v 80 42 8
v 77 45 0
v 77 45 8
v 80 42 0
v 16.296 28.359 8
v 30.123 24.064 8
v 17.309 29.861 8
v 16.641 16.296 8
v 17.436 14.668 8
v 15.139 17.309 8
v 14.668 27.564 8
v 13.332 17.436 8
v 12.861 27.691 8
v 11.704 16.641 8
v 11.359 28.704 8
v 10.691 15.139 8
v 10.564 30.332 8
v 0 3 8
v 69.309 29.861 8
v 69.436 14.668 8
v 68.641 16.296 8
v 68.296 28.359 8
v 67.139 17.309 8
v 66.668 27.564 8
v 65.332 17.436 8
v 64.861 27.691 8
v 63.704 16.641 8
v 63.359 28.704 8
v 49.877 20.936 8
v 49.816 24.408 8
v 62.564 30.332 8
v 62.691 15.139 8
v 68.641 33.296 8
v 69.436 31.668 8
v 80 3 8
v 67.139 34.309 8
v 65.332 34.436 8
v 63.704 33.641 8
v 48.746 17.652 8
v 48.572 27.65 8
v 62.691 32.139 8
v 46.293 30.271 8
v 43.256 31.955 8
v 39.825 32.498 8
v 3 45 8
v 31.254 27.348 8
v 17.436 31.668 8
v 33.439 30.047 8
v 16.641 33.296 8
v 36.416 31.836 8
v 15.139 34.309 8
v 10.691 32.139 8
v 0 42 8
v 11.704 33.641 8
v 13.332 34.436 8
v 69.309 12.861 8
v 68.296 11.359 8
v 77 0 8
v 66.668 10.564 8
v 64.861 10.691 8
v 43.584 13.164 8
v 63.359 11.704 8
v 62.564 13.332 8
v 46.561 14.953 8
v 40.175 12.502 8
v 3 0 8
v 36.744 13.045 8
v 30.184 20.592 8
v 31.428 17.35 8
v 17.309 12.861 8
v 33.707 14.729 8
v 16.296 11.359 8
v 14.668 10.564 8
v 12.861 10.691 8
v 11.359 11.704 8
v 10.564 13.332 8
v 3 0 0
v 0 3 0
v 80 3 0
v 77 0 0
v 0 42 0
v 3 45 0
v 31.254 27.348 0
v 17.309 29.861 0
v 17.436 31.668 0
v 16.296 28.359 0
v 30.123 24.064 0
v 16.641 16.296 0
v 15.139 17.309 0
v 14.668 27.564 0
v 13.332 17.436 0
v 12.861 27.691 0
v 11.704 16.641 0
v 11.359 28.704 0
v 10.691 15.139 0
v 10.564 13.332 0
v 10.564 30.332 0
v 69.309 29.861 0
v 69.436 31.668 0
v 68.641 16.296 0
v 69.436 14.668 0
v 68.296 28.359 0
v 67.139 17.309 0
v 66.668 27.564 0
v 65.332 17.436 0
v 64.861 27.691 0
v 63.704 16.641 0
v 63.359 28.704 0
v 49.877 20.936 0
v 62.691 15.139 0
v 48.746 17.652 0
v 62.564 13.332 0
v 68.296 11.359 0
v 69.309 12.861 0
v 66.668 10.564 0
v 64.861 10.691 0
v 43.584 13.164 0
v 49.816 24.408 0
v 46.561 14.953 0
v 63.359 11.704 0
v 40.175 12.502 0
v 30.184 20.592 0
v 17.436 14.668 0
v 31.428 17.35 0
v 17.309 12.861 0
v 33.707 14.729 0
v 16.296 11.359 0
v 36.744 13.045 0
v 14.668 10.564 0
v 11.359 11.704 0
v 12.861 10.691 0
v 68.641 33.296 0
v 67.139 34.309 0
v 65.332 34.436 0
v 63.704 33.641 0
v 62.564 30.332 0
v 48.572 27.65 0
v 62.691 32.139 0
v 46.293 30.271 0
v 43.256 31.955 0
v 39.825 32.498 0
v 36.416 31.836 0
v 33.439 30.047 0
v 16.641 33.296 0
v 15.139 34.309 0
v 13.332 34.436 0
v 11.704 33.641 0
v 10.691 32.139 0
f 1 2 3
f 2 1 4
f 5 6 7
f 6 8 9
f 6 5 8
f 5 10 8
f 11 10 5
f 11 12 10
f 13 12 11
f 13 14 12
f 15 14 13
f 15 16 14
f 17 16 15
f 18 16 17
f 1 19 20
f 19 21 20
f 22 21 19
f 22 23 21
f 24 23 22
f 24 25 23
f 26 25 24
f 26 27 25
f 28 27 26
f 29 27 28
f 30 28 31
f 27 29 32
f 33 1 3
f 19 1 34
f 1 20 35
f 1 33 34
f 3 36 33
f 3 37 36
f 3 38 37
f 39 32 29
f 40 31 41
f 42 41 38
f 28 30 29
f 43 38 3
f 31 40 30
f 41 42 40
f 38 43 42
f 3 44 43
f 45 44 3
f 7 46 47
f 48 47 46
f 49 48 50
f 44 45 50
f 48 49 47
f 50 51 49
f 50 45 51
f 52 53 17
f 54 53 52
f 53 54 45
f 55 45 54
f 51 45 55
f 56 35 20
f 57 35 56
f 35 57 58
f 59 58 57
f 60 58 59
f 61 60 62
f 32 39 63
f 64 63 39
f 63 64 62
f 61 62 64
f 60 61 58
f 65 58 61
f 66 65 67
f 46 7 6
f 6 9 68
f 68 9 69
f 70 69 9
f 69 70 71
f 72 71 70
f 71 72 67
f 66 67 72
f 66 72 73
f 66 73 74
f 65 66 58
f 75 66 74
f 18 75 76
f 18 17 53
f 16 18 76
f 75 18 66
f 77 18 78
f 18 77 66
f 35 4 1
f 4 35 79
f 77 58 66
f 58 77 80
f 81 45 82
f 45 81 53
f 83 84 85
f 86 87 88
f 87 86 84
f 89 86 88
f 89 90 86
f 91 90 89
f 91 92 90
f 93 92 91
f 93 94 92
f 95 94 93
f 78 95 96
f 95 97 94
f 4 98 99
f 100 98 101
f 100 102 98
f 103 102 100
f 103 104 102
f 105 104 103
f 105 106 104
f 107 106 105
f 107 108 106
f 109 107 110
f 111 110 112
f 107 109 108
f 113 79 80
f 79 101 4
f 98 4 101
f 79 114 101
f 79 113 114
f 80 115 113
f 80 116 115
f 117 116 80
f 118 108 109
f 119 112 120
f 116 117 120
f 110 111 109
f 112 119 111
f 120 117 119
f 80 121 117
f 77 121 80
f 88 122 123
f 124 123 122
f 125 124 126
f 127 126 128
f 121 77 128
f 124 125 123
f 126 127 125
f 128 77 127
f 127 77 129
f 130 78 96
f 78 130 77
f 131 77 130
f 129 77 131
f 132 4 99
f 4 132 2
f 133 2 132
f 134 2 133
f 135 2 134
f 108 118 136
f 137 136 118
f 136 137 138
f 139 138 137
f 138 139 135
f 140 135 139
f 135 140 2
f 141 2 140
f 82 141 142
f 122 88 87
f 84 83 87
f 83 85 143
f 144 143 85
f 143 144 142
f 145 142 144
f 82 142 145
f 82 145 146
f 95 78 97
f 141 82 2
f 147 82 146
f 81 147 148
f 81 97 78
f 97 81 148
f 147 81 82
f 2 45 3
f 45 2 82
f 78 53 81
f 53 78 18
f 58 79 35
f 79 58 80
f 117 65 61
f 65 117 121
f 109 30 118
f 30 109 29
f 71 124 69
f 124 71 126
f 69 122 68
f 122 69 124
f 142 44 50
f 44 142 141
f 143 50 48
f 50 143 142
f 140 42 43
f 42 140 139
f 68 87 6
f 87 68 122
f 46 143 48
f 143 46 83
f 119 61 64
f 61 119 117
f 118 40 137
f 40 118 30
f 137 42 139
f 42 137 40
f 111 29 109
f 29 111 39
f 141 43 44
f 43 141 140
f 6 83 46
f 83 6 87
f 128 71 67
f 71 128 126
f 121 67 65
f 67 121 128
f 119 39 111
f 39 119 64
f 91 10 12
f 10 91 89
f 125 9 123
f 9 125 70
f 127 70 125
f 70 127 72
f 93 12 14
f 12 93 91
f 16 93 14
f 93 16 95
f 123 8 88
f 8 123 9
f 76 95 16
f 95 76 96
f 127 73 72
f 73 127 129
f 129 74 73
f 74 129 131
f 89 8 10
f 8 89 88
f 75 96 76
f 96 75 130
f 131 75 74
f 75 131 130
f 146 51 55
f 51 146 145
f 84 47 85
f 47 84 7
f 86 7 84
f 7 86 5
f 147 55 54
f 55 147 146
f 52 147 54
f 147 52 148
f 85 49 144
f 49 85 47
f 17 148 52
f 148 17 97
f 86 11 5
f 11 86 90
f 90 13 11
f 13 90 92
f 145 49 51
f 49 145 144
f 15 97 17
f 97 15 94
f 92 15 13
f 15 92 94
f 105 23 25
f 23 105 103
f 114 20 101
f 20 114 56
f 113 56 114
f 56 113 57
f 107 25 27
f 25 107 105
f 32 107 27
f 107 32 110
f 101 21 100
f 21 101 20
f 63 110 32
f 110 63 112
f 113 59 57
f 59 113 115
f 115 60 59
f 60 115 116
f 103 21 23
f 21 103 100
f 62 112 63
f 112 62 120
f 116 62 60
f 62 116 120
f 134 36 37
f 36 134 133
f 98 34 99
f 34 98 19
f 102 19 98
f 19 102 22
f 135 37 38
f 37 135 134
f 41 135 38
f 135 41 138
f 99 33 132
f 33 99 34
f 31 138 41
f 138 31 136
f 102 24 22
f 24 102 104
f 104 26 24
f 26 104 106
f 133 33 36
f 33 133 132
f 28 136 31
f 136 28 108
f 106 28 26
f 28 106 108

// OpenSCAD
$fn = 32;

// ----------------------------------------------------------------------
// Spacer plate: rect 80 x 45
// ----------------------------------------------------------------------

// --- parameters (mm) ---
bore_r = 10;              // centre bore radius
bolt_r = 3.5;             // bolt hole radius
plate_t = 8;              // plate thickness, Z (extrusion height)
plate_l = 80;             // plate length, X
plate_w = 45;             // plate width, Y
inset = 14;               // corner hole inset

profile = [[3, 0], [77, 0], [80, 3], [80, 42], [77, 45], [3, 45], [0, 42], [0, 3]];  // primary outline, 8 points, counter clockwise
void_1 = [[49.816, 24.408], [48.572, 27.65], [46.293, 30.271], [43.256, 31.955], [39.825, 32.498], [36.416, 31.836], [33.439, 30.047], [31.254, 27.348], [30.123, 24.064], [30.184, 20.592], [31.428, 17.35], [33.707, 14.729], [36.744, 13.045], [40.175, 12.502], [43.584, 13.164], [46.561, 14.953], [48.746, 17.652], [49.877, 20.936]];  // centre bore, 18 points
void_2 = [[17.436, 14.668], [16.641, 16.296], [15.139, 17.309], [13.332, 17.436], [11.704, 16.641], [10.691, 15.139], [10.564, 13.332], [11.359, 11.704], [12.861, 10.691], [14.668, 10.564], [16.296, 11.359], [17.309, 12.861]];  // corner hole, 12 points
void_3 = [[17.436, 31.668], [16.641, 33.296], [15.139, 34.309], [13.332, 34.436], [11.704, 33.641], [10.691, 32.139], [10.564, 30.332], [11.359, 28.704], [12.861, 27.691], [14.668, 27.564], [16.296, 28.359], [17.309, 29.861]];  // corner hole, 12 points
void_4 = [[69.436, 14.668], [68.641, 16.296], [67.139, 17.309], [65.332, 17.436], [63.704, 16.641], [62.691, 15.139], [62.564, 13.332], [63.359, 11.704], [64.861, 10.691], [66.668, 10.564], [68.296, 11.359], [69.309, 12.861]];  // corner hole, 12 points
void_5 = [[69.436, 31.668], [68.641, 33.296], [67.139, 34.309], [65.332, 34.436], [63.704, 33.641], [62.691, 32.139], [62.564, 30.332], [63.359, 28.704], [64.861, 27.691], [66.668, 27.564], [68.296, 28.359], [69.309, 29.861]];  // corner hole, 12 points

// --- the one profile operation ---
difference() {
  linear_extrude(height = plate_t) polygon(points = profile);
  translate([0, 0, -1])
    linear_extrude(height = plate_t + 2) polygon(points = void_1);
  translate([0, 0, -1])
    linear_extrude(height = plate_t + 2) polygon(points = void_2);
  translate([0, 0, -1])
    linear_extrude(height = plate_t + 2) polygon(points = void_3);
  translate([0, 0, -1])
    linear_extrude(height = plate_t + 2) polygon(points = void_4);
  translate([0, 0, -1])
    linear_extrude(height = plate_t + 2) polygon(points = void_5);
}
